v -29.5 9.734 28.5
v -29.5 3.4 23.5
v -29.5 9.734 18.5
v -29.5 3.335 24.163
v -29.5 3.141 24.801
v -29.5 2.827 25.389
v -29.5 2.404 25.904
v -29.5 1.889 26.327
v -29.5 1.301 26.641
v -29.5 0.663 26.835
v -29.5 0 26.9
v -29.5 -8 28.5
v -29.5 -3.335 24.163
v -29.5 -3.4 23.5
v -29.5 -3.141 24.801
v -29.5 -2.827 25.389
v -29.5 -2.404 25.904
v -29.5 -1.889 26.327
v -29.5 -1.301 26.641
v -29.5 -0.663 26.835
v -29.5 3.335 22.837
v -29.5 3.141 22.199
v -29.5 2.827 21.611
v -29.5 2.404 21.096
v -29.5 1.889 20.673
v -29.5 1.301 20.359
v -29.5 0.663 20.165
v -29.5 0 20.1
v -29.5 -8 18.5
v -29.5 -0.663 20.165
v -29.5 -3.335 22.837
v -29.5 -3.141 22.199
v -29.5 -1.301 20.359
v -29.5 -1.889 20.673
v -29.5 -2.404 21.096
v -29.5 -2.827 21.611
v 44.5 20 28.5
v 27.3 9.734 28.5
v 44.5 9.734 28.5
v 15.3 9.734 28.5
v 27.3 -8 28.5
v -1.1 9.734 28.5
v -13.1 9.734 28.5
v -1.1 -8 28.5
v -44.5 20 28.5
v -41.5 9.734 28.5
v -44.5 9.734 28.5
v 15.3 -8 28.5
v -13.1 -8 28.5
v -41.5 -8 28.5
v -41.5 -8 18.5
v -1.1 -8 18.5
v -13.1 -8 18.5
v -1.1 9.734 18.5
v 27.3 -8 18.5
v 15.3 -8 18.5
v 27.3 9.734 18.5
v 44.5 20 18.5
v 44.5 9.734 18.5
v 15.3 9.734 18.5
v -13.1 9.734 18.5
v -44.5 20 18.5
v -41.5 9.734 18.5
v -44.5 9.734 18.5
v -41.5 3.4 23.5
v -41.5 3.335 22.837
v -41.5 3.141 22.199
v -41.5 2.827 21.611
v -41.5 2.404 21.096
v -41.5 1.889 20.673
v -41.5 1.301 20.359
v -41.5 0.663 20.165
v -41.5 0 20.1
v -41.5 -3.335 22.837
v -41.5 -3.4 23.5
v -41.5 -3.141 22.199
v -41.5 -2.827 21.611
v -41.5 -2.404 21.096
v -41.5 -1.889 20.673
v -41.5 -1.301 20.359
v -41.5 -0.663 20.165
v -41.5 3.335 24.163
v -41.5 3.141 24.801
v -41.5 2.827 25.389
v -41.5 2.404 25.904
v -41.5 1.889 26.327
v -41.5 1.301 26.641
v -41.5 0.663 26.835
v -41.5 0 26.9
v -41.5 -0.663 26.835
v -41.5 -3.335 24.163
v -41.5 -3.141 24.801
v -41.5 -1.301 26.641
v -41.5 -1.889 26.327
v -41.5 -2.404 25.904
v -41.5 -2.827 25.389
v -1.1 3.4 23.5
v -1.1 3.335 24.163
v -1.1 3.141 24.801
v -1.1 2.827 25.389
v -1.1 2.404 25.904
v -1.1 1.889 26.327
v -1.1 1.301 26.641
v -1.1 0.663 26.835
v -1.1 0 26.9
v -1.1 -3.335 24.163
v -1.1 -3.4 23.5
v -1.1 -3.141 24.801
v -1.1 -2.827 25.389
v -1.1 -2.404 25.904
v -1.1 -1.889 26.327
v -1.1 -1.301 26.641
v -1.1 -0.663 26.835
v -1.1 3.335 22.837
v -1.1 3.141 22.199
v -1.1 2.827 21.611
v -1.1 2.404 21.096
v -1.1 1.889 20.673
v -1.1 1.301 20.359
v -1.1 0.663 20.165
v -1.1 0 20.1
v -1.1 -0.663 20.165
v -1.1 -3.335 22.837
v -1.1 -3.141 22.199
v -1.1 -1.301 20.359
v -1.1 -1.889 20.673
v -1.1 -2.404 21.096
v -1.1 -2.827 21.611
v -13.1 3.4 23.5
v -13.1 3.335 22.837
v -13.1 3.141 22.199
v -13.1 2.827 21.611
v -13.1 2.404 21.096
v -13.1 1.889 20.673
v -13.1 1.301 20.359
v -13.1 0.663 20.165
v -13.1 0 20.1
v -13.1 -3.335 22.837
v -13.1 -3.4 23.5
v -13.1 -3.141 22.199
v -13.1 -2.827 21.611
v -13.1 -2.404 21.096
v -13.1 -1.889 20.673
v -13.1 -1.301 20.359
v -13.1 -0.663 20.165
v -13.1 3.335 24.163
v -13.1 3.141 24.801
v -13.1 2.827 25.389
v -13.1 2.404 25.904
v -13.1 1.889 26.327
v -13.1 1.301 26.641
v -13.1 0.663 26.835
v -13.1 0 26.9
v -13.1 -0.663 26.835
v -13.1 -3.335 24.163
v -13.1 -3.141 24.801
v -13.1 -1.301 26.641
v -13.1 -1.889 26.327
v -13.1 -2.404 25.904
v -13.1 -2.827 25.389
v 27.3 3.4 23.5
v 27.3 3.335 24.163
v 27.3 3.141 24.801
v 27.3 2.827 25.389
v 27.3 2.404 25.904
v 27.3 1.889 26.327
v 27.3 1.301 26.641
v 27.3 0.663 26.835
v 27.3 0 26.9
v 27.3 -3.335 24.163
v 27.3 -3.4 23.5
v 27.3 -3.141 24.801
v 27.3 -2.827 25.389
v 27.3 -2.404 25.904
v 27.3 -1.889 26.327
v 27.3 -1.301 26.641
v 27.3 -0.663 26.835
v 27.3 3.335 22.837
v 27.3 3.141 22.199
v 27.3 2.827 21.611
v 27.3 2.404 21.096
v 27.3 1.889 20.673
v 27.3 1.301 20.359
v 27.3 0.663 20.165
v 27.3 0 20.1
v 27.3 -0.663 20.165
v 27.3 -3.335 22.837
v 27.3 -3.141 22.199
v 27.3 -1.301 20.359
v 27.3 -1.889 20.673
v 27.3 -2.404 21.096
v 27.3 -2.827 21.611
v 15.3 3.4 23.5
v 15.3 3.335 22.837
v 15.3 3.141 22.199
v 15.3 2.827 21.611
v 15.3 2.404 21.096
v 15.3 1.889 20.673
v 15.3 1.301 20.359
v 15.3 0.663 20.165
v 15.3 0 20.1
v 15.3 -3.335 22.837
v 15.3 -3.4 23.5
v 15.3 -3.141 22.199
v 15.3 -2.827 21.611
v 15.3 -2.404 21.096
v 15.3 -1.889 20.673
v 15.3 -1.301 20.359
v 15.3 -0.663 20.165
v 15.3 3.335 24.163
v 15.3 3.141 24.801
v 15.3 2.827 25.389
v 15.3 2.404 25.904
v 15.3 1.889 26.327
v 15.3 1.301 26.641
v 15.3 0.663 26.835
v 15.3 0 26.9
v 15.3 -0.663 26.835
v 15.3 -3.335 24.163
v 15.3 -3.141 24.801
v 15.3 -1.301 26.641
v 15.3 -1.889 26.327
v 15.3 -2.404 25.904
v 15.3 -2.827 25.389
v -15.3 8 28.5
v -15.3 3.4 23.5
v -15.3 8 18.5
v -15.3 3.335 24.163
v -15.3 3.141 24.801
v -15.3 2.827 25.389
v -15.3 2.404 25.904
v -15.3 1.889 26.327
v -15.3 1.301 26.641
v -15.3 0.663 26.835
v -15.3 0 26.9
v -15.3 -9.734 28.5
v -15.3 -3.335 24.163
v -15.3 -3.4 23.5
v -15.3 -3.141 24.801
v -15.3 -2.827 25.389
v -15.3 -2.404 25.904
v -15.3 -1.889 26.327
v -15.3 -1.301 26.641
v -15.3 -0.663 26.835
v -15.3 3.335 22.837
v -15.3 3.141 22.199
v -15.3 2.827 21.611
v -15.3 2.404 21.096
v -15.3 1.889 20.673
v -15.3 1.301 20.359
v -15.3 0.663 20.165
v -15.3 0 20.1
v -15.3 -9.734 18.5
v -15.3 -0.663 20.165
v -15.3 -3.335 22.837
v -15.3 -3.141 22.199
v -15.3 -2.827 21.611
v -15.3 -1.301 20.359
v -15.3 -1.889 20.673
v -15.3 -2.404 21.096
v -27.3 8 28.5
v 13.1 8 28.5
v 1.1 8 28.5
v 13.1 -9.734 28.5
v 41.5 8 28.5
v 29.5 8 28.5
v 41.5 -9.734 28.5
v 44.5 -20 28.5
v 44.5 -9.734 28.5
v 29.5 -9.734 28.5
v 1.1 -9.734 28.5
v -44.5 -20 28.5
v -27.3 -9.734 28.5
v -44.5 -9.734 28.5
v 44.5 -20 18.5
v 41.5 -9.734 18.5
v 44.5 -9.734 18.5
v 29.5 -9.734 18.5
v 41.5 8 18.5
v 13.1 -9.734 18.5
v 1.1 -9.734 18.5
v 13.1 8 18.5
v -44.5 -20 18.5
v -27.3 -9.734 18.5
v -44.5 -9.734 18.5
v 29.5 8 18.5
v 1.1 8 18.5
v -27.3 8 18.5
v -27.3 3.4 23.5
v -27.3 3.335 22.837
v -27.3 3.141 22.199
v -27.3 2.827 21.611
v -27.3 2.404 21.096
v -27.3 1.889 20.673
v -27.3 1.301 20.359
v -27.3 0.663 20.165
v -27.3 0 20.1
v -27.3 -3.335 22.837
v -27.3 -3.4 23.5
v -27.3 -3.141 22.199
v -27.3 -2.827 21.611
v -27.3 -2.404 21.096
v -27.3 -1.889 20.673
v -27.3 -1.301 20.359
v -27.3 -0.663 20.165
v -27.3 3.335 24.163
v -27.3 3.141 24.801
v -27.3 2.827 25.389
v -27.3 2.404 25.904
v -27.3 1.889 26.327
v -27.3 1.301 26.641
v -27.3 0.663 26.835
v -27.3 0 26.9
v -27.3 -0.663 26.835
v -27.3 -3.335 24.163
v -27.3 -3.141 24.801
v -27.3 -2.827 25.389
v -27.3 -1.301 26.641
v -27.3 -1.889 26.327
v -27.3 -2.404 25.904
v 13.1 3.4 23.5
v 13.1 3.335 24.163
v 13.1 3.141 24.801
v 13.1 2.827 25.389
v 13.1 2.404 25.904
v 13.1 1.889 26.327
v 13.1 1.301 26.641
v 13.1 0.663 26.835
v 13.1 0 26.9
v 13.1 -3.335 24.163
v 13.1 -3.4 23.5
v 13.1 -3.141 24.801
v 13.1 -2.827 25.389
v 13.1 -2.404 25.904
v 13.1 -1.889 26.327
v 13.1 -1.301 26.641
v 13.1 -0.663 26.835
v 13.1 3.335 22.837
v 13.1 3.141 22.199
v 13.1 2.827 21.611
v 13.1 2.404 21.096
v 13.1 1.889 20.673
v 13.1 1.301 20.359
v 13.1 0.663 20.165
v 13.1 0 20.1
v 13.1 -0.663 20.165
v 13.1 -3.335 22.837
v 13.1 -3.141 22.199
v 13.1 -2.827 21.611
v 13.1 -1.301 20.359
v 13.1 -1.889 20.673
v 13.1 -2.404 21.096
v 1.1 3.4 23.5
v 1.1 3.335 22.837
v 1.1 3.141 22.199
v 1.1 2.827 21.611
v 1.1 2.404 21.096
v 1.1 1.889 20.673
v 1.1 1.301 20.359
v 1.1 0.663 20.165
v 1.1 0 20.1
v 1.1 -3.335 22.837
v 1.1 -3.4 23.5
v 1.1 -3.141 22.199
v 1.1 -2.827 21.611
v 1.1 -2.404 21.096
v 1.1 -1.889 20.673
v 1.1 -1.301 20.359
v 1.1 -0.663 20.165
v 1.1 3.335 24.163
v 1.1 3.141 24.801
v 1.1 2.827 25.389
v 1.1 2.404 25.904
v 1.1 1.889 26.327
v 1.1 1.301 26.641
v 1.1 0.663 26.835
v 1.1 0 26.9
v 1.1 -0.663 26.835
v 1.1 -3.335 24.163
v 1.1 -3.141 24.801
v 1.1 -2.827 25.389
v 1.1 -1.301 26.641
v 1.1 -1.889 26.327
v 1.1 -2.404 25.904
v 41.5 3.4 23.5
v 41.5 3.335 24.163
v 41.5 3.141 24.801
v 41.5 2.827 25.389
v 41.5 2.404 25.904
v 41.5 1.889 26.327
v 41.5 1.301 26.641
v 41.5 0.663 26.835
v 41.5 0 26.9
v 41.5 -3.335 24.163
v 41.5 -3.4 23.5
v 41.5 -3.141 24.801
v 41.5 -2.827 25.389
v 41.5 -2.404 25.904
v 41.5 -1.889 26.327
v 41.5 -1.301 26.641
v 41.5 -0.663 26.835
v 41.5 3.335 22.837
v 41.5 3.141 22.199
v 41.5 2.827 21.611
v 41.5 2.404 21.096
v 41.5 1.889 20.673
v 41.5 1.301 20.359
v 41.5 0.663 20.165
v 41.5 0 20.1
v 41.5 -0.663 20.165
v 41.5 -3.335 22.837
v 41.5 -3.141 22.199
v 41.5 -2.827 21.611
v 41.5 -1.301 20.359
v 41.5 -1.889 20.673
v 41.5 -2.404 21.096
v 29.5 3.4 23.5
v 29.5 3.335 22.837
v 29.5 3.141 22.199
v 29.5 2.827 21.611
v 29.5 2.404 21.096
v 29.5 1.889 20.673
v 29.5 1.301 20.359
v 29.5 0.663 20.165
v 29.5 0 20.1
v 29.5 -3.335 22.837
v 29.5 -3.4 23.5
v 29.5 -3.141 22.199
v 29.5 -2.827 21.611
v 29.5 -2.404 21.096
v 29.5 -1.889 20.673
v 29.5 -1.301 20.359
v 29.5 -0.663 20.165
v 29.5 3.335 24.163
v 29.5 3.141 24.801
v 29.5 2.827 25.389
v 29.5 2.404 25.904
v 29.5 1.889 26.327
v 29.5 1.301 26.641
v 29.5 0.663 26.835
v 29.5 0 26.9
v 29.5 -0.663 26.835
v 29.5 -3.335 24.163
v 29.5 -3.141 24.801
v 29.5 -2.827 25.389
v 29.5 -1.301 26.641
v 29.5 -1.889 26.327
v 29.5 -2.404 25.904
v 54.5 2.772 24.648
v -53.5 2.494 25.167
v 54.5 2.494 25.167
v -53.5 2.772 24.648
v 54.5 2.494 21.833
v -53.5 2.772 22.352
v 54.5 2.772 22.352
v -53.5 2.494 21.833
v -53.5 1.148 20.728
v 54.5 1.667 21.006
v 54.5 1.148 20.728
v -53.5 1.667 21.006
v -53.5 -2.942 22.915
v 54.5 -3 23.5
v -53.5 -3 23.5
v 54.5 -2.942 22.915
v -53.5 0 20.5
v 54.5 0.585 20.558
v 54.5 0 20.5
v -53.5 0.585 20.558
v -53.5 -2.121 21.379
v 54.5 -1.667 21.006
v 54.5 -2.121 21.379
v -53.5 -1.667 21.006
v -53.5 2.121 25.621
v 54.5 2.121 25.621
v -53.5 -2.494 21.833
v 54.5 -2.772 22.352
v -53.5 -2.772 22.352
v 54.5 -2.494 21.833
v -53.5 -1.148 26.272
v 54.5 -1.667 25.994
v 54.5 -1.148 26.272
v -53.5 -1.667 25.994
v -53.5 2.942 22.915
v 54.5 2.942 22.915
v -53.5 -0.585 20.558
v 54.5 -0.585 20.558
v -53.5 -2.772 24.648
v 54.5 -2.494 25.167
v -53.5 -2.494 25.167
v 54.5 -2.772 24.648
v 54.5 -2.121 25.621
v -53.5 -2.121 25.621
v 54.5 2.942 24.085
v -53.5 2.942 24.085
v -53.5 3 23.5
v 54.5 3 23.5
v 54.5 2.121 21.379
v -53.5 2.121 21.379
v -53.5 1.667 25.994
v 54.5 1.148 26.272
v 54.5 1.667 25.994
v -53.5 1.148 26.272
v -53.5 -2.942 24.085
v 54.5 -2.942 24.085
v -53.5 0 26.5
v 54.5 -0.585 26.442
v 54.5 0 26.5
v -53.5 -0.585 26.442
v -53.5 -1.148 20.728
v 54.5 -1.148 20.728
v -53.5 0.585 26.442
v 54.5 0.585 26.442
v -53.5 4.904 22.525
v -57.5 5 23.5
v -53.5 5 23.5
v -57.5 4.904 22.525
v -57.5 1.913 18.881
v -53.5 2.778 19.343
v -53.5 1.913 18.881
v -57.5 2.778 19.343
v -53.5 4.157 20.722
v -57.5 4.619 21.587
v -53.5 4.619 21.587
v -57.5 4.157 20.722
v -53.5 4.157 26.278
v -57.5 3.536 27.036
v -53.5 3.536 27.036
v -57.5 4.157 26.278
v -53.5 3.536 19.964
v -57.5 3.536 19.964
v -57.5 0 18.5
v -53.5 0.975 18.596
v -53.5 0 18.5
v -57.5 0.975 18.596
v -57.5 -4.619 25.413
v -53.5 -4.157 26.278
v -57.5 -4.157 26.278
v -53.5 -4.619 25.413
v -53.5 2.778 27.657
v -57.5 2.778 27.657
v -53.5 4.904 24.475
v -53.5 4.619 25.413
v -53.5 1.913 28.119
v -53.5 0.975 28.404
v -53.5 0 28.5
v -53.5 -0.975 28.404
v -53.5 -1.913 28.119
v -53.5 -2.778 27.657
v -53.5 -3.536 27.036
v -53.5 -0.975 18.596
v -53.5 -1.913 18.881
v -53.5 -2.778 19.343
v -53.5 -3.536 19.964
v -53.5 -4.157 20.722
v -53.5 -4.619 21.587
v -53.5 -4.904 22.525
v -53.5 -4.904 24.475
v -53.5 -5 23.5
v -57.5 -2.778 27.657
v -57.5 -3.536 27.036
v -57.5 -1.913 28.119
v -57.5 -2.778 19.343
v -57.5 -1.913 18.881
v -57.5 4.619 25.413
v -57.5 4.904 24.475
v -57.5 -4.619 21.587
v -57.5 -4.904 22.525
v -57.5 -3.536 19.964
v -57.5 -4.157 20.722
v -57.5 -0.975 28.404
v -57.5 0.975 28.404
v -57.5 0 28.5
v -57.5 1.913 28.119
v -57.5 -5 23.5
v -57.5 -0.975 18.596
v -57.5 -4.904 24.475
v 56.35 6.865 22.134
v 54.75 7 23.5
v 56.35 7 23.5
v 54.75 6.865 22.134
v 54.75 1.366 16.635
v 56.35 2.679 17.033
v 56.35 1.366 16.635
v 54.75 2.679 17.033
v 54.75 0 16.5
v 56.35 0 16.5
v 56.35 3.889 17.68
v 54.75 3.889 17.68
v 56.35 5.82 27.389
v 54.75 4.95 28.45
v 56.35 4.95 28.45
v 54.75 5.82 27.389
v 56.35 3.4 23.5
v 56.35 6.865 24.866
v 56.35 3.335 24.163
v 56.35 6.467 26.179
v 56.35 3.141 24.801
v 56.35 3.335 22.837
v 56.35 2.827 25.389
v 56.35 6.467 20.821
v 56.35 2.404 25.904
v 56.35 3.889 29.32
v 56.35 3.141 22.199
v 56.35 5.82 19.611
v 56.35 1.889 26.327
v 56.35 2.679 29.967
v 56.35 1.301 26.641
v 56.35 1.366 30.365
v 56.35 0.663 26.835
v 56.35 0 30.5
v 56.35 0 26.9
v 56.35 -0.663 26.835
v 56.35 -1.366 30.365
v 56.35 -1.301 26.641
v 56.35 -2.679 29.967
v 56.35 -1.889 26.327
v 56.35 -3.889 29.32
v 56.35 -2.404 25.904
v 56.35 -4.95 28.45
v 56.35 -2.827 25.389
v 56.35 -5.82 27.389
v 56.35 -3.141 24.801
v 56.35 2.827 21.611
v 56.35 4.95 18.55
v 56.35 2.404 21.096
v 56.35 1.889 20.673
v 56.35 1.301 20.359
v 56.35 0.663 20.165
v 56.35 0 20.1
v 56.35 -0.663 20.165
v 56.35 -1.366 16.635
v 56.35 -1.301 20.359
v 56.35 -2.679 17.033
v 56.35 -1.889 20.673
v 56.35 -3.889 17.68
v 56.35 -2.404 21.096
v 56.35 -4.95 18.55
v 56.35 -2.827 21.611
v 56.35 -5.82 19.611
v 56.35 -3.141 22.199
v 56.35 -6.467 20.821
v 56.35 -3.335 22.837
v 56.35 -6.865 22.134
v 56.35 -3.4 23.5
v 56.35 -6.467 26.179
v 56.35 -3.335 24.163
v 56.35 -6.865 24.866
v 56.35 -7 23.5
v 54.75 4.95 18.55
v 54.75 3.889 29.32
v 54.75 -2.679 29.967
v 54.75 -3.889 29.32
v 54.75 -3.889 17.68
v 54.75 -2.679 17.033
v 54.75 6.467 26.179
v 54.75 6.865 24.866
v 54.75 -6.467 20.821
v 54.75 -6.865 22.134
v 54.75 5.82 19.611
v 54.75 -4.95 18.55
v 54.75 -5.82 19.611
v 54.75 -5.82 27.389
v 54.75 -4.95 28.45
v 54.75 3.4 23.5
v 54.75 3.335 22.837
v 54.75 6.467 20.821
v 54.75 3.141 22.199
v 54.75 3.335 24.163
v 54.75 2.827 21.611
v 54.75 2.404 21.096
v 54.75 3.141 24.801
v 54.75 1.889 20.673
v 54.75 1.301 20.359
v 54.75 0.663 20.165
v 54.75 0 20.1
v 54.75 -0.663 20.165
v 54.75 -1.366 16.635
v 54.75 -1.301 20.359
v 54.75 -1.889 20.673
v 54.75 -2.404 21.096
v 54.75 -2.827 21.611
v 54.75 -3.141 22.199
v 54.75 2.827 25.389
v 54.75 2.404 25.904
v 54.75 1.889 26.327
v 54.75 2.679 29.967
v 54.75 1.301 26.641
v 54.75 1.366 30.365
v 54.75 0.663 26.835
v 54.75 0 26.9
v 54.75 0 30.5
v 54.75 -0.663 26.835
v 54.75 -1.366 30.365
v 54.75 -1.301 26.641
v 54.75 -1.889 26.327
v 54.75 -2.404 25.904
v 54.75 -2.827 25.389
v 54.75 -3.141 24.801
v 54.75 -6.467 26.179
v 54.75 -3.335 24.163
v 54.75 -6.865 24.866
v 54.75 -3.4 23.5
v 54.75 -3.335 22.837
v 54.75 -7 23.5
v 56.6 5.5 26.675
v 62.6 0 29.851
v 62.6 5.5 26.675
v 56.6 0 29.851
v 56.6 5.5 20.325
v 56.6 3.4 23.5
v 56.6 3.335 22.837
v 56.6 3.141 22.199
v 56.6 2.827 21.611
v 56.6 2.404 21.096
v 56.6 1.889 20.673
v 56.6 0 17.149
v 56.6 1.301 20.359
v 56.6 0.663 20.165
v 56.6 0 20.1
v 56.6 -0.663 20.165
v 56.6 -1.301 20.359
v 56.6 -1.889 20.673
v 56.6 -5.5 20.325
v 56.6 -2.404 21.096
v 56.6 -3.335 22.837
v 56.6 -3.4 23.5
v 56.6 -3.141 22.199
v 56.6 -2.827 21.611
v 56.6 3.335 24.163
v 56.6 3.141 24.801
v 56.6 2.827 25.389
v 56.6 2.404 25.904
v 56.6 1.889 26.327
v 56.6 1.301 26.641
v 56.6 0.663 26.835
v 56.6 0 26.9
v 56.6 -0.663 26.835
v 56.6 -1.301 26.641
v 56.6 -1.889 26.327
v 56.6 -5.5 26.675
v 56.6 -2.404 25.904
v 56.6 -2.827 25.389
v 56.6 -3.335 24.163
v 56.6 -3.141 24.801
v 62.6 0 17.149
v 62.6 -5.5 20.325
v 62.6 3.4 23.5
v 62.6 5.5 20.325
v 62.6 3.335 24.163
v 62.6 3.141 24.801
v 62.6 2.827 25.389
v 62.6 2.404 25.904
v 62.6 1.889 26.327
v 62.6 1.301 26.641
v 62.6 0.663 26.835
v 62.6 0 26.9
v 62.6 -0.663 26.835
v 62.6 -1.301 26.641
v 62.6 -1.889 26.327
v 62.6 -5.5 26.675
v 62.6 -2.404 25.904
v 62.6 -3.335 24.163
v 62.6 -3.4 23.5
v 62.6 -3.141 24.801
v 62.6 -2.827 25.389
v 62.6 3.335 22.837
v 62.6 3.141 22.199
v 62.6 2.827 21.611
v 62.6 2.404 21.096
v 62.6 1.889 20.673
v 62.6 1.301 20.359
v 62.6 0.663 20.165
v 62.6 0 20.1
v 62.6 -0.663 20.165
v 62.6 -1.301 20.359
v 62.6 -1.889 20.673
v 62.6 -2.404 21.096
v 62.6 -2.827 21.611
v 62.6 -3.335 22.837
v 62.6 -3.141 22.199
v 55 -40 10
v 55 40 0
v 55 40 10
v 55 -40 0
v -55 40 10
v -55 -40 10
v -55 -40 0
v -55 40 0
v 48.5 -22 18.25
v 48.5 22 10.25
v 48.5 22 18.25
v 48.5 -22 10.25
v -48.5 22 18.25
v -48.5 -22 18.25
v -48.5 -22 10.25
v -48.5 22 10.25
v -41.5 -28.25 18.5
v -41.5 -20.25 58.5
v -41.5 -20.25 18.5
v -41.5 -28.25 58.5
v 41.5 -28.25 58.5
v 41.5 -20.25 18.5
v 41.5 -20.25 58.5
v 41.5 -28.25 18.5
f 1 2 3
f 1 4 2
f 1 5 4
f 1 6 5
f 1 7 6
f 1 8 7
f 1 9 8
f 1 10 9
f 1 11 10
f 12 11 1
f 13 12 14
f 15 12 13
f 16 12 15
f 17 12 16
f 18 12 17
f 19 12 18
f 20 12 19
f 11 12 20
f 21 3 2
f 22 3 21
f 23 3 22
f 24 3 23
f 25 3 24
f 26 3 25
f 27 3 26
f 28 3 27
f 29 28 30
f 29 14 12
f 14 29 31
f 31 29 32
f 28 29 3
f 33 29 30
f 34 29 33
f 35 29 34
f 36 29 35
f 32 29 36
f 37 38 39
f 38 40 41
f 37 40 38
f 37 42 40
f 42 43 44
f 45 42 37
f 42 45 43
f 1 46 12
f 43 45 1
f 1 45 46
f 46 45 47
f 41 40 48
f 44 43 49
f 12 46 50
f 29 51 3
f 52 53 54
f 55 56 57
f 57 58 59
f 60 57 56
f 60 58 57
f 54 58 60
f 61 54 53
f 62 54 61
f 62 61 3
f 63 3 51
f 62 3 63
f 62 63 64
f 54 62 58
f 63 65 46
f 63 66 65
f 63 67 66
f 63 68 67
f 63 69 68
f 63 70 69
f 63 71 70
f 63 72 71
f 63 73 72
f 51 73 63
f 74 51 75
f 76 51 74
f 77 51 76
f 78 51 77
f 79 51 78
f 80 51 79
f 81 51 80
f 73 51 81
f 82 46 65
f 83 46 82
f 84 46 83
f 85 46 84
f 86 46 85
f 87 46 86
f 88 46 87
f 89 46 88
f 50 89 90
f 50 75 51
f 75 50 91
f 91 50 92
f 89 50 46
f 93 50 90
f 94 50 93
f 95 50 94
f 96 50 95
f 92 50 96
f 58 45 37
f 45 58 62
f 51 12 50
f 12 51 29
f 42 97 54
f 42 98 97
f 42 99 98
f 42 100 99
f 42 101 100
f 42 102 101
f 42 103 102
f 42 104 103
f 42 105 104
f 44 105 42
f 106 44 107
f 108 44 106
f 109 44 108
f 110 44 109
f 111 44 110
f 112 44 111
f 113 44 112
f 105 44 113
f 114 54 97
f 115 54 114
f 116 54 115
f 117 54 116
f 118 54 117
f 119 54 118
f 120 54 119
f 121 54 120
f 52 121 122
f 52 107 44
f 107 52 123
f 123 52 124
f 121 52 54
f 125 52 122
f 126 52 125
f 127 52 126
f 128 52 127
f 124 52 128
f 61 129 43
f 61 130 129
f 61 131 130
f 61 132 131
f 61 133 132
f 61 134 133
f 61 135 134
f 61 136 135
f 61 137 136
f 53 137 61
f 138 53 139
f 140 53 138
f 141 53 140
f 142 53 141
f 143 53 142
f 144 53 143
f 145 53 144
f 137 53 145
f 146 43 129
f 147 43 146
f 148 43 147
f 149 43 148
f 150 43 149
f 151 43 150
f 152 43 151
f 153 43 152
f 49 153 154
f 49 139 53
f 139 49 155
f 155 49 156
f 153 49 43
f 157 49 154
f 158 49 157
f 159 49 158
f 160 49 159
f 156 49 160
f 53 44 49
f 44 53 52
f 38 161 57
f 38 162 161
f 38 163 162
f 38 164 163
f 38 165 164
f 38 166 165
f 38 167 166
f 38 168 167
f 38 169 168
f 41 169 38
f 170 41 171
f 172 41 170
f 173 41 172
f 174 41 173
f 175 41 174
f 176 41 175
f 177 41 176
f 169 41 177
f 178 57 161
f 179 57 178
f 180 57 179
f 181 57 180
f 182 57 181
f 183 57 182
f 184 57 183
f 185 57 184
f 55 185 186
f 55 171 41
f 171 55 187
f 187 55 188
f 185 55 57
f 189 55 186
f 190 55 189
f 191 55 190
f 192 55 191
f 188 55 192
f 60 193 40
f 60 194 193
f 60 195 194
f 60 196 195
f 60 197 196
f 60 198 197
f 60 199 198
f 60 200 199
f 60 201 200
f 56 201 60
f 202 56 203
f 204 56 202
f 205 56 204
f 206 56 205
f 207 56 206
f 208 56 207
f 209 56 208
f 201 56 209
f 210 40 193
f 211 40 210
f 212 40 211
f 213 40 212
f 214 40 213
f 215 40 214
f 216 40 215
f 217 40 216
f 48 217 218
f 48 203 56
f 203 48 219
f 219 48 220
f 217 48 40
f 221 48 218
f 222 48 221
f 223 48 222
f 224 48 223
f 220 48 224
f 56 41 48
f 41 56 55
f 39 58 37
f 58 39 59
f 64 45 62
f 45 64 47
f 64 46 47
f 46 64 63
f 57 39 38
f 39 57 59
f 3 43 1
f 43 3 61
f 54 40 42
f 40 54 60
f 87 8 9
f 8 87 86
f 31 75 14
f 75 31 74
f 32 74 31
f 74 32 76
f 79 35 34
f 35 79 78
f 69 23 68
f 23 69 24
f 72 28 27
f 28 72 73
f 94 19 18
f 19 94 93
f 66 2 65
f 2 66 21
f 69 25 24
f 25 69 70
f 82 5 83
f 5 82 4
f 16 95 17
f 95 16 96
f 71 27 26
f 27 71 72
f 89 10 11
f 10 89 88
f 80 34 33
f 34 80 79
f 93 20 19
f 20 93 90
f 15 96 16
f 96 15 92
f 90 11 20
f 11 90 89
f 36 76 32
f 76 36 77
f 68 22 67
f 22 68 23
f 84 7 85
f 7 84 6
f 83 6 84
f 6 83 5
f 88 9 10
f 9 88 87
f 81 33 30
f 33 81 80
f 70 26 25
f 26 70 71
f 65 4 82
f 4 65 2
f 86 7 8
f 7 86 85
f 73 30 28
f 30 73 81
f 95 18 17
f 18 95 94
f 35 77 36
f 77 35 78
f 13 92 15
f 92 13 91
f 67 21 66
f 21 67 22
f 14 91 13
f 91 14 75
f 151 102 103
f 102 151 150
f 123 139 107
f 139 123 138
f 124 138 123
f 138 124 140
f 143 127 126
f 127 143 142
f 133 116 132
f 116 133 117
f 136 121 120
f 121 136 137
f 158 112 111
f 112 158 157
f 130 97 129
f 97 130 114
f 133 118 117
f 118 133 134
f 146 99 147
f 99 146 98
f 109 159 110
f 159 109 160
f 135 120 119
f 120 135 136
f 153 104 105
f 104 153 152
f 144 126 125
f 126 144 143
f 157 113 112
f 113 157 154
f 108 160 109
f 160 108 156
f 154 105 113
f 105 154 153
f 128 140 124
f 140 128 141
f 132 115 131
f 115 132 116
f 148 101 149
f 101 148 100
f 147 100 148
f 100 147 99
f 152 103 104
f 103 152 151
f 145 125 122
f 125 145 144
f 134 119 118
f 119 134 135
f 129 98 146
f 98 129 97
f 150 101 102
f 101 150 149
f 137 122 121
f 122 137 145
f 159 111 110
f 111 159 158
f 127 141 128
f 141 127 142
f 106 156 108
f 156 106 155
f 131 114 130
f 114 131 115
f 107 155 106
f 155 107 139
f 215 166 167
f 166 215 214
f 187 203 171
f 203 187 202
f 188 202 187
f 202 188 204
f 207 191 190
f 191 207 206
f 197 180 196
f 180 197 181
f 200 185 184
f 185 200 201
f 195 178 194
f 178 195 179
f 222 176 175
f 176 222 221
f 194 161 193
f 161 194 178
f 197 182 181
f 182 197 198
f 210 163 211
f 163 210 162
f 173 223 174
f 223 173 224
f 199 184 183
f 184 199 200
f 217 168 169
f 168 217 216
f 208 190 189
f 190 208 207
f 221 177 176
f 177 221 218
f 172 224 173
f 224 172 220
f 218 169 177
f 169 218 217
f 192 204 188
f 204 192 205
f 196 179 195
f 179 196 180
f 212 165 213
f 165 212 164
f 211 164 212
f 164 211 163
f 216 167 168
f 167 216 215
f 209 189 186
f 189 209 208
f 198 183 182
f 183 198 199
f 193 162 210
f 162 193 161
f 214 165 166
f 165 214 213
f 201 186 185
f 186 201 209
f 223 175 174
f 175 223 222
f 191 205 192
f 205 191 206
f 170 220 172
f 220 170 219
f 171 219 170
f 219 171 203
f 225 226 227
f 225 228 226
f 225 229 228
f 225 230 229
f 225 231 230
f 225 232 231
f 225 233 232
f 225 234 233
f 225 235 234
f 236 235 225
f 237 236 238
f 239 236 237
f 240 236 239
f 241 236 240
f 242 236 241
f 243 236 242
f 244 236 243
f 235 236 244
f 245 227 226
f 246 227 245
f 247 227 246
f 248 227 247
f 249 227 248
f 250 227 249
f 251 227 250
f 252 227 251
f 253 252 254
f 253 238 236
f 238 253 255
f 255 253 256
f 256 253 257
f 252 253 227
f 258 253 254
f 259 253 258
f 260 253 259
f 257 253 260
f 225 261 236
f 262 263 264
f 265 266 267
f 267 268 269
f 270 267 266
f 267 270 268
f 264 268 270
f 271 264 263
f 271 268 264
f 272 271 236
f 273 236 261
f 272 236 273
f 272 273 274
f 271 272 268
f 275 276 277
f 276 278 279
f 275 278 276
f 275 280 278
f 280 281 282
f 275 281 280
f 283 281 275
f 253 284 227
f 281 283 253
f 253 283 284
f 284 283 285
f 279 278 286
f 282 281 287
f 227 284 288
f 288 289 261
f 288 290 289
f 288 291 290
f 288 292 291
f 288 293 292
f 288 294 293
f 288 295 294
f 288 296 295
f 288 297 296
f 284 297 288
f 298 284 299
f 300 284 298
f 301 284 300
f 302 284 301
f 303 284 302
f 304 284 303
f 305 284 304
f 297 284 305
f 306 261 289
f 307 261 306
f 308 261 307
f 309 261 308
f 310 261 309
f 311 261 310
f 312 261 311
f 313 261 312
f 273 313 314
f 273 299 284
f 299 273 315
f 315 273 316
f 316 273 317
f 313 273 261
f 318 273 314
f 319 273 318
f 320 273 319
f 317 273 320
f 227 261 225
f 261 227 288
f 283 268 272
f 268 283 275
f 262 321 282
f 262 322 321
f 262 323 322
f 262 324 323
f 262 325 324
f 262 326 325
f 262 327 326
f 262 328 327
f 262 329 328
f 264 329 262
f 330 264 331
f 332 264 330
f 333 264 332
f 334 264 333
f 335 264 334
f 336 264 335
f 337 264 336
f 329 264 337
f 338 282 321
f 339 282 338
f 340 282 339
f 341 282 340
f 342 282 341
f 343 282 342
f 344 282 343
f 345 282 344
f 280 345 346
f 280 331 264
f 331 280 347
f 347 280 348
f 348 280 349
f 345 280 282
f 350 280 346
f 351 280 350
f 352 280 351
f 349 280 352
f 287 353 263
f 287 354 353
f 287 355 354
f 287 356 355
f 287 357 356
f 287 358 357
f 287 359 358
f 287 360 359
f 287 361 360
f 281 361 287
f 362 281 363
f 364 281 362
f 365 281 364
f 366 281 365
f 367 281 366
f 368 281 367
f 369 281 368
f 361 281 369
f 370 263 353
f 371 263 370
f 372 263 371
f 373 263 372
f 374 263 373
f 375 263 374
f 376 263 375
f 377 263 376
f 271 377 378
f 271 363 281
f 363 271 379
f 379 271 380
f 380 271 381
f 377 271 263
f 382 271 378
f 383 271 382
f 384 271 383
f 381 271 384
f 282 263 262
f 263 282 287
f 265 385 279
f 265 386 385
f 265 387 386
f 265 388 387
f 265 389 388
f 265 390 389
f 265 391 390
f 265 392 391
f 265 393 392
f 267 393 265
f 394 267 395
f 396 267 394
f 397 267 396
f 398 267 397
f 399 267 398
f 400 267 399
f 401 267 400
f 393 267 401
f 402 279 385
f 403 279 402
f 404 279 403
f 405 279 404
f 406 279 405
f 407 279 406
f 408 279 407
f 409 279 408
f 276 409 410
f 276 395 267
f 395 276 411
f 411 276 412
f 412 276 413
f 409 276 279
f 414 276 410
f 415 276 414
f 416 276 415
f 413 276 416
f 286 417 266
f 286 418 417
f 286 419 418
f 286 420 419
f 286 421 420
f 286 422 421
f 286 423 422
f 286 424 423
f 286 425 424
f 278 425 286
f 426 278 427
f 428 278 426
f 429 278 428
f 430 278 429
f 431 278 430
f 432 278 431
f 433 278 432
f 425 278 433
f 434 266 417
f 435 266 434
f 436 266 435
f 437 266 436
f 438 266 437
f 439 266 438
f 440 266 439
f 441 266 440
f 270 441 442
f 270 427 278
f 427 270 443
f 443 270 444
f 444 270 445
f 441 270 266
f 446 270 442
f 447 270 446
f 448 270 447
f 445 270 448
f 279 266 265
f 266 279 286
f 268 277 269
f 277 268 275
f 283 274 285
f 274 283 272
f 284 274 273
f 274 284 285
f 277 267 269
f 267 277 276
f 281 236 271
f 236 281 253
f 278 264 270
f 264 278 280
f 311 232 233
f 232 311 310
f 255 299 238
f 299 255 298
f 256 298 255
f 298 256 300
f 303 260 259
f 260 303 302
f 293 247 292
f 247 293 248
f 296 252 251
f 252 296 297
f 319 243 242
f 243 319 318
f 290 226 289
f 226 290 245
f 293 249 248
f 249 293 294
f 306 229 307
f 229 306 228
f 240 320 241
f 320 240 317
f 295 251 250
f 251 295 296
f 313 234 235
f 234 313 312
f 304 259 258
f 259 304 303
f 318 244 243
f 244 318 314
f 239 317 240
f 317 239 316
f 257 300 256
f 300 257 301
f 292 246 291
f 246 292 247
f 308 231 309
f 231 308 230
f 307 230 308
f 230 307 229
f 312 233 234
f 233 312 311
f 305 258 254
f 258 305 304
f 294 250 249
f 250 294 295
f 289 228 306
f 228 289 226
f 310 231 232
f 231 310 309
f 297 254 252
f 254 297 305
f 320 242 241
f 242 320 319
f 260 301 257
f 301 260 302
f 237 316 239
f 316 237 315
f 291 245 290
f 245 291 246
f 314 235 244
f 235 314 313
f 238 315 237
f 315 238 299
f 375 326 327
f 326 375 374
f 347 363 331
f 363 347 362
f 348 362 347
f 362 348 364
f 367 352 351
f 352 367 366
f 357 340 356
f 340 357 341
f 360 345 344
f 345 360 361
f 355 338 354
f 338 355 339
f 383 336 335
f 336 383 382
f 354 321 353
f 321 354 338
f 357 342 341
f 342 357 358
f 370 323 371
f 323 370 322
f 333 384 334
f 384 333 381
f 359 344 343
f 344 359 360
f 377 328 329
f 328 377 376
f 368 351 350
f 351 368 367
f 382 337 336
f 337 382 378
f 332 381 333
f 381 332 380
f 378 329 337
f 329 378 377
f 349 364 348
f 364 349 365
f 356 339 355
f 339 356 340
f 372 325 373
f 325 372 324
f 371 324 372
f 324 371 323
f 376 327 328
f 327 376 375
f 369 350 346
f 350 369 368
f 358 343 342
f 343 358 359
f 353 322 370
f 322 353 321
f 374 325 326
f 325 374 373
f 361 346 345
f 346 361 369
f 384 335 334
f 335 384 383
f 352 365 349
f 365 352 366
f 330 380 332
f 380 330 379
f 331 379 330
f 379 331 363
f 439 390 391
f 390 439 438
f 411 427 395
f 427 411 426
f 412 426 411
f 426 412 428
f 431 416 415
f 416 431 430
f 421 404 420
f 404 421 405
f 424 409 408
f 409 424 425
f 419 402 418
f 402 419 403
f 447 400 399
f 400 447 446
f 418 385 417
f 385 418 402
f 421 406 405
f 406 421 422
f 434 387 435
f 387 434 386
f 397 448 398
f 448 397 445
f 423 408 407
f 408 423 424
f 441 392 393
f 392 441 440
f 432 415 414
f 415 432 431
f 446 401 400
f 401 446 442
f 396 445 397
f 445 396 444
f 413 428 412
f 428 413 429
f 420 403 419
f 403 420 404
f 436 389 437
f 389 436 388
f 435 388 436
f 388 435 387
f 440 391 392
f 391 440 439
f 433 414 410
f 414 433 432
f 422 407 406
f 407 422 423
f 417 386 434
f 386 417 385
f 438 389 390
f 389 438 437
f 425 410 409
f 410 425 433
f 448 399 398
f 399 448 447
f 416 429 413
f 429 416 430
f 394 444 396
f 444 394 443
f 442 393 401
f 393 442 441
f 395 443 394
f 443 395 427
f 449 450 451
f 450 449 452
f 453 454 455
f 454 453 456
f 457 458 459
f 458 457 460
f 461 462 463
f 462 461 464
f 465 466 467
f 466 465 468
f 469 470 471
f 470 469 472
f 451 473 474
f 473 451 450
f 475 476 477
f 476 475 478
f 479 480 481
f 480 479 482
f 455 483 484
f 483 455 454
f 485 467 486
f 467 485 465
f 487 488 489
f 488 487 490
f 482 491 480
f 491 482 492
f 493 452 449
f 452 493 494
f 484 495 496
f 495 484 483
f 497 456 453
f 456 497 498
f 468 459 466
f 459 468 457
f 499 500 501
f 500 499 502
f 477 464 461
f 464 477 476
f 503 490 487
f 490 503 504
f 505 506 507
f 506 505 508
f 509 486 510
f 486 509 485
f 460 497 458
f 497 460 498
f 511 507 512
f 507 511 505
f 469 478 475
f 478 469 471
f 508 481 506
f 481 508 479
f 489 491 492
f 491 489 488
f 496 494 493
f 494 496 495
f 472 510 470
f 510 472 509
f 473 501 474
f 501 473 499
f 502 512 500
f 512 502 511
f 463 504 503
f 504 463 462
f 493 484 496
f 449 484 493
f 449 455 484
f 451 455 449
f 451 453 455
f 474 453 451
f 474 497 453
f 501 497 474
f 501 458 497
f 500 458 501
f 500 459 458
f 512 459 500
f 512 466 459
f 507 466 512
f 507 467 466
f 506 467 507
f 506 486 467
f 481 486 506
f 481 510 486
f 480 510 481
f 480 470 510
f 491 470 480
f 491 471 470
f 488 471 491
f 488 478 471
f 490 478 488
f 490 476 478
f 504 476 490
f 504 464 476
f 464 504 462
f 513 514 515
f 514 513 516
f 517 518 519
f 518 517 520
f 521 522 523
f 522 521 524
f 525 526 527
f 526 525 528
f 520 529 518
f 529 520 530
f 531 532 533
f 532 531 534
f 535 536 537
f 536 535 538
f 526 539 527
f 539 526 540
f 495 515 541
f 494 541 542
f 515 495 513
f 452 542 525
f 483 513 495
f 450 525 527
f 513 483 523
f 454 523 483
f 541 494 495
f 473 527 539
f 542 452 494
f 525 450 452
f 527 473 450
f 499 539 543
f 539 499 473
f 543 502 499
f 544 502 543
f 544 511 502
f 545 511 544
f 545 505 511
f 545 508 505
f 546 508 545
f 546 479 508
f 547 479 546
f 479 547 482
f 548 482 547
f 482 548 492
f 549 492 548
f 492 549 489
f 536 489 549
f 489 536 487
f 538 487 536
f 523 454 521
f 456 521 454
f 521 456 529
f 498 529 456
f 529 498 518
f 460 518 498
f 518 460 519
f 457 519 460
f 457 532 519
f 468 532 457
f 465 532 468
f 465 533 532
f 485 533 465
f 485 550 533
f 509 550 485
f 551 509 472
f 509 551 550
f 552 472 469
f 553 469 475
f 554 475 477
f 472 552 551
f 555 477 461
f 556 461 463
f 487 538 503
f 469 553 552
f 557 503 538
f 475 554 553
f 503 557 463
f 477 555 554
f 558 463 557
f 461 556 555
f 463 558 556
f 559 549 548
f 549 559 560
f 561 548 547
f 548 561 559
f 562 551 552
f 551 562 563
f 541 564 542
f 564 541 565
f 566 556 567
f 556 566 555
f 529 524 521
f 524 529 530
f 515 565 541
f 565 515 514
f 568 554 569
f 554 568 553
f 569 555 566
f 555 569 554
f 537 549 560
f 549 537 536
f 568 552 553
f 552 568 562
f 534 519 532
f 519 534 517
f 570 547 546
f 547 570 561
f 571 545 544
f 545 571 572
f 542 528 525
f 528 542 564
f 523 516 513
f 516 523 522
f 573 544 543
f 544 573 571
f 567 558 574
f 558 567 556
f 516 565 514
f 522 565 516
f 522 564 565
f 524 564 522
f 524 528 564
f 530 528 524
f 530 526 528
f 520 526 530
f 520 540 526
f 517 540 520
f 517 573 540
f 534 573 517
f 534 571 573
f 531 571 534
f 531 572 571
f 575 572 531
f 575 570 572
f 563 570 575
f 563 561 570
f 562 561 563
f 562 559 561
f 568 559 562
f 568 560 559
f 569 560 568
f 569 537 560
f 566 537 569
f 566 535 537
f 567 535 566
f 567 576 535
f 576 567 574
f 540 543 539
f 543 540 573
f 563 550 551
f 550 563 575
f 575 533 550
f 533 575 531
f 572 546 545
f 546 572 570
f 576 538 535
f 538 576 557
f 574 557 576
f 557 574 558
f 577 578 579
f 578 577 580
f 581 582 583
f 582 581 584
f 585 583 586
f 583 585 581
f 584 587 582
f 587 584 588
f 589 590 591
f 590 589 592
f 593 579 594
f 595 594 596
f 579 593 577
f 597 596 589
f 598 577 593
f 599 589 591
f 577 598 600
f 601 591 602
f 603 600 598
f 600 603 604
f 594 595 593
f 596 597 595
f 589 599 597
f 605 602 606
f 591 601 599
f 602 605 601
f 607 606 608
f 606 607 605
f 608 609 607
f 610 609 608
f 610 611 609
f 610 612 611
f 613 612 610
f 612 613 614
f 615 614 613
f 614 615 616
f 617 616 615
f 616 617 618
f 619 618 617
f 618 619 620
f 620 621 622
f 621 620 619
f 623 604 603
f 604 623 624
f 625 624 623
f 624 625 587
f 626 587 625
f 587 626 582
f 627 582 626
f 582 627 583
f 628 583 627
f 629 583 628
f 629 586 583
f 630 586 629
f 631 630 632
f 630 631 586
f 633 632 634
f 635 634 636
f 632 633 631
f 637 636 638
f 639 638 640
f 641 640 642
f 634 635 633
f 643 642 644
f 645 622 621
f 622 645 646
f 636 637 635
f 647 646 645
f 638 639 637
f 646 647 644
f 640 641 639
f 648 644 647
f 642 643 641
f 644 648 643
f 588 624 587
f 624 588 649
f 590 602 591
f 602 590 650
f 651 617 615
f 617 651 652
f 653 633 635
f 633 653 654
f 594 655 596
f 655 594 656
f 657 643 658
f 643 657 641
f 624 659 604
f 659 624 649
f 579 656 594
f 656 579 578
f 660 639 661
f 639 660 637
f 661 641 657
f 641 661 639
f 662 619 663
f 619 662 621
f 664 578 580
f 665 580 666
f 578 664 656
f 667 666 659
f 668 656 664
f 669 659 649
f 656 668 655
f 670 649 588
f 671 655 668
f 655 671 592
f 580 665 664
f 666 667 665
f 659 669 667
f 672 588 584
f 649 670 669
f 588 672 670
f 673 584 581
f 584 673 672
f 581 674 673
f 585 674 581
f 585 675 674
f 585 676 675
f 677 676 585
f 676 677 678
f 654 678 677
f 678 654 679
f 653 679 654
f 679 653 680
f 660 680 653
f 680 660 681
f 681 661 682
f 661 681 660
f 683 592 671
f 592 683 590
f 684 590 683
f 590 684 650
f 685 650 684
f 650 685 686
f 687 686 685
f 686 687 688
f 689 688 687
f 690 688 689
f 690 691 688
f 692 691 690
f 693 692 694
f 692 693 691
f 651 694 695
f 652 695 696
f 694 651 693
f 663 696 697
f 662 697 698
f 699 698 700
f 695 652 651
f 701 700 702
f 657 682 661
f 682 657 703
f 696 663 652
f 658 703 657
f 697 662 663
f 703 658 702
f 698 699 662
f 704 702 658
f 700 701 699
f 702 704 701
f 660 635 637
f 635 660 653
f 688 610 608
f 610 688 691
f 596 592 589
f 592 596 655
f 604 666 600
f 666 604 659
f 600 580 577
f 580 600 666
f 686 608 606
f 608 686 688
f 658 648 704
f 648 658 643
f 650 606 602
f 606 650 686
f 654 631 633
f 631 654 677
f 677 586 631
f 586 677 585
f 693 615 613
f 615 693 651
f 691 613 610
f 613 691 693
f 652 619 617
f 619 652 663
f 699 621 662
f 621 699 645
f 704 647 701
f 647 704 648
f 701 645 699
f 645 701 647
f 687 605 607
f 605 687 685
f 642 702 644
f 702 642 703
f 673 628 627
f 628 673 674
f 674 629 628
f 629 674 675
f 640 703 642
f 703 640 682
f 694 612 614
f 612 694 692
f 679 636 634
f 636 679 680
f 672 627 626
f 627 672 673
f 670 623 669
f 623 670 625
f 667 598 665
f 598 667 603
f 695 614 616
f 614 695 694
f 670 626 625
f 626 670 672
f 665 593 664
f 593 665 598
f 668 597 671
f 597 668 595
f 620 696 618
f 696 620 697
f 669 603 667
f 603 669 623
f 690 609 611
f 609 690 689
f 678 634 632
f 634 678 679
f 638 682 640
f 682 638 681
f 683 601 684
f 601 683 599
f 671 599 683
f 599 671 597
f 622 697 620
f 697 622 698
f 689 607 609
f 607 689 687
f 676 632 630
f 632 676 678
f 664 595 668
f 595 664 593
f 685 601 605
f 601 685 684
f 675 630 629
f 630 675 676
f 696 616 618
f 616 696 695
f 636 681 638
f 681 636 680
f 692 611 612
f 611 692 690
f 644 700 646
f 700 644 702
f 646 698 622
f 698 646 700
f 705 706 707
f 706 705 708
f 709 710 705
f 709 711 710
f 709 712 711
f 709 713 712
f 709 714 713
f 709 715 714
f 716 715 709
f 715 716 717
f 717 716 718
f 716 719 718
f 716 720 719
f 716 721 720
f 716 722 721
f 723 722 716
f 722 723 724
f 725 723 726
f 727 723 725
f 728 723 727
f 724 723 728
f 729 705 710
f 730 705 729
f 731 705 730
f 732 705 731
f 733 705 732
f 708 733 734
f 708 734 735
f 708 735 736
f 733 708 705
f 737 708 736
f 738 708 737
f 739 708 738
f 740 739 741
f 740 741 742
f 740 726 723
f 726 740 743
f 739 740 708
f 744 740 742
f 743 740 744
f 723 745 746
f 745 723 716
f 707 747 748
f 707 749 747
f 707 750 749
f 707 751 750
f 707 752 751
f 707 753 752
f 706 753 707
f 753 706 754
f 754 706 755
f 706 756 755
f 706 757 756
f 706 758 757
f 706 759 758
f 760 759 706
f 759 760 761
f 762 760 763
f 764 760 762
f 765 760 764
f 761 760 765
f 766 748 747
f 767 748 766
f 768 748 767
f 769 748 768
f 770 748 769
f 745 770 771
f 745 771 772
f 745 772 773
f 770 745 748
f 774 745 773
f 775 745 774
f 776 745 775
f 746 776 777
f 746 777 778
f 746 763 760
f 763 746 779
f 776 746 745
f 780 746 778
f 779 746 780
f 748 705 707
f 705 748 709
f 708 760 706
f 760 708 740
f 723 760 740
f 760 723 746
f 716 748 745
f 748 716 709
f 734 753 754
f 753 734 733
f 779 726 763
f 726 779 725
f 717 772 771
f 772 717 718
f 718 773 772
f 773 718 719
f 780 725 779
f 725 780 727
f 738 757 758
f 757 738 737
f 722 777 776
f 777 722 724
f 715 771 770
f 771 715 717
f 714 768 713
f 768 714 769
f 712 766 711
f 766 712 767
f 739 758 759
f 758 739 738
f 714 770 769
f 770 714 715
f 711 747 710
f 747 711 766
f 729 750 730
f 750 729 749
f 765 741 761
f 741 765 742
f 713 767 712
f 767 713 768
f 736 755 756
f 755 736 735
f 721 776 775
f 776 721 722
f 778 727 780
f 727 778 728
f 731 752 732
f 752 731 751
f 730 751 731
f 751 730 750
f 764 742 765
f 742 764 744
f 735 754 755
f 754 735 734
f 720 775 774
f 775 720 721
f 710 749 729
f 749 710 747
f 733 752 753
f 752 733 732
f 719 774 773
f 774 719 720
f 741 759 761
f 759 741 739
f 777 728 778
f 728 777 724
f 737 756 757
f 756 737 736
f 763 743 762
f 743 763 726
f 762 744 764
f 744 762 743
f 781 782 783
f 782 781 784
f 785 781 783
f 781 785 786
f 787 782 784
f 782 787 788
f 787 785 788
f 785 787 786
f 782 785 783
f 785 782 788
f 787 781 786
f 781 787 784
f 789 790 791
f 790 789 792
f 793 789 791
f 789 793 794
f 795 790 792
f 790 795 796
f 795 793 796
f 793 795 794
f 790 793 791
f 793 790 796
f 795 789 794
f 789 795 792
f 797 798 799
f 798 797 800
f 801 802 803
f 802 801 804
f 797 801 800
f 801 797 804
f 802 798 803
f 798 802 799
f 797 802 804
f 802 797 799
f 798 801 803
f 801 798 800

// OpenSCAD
$fn = 32;

// ------------------------------------------------------------------------
// Comb hinge with flap: leaf 89 x 20 mm, pin d6, flap 40 mm
// Every part is its own module, assembly() places every instance.
// ------------------------------------------------------------------------

// --- part 1 ---
module hinge_bed() {
  difference() {
    translate([-55, -40, 0]) cube([110, 80, 10]);
  }
}

// --- part 2 ---
module hinge_riser() {
  difference() {
    translate([-48.5, -22, 0]) cube([97, 44, 8]);
  }
}

// --- part 3 ---
module hinge_leaf_a() {
  difference() {
    union() {
      translate([-41.5, -8, -5]) cube([12, 28, 10]);
      translate([-13.1, -8, -5]) cube([12, 28, 10]);
      translate([15.3, -8, -5]) cube([12, 28, 10]);
      translate([-44.5, 9.734, -5]) cube([89, 10.266, 10]);
    }
    translate([-35.5, 0, 0]) rotate([0, 90, 0]) cylinder(h = 14, d = 6.8, center = true);
    translate([-7.1, 0, 0]) rotate([0, 90, 0]) cylinder(h = 14, d = 6.8, center = true);
    translate([21.3, 0, 0]) rotate([0, 90, 0]) cylinder(h = 14, d = 6.8, center = true);
  }
}

// --- part 4 ---
module hinge_leaf_b() {
  difference() {
    union() {
      translate([-27.3, -20, -5]) cube([12, 28, 10]);
      translate([1.1, -20, -5]) cube([12, 28, 10]);
      translate([29.5, -20, -5]) cube([12, 28, 10]);
      translate([-44.5, -20, -5]) cube([89, 10.266, 10]);
    }
    translate([-21.3, 0, 0]) rotate([0, 90, 0]) cylinder(h = 14, d = 6.8, center = true);
    translate([7.1, 0, 0]) rotate([0, 90, 0]) cylinder(h = 14, d = 6.8, center = true);
    translate([35.5, 0, 0]) rotate([0, 90, 0]) cylinder(h = 14, d = 6.8, center = true);
  }
}

// --- part 5 ---
module hinge_flap() {
  difference() {
    translate([-41.5, -20, 0]) cube([83, 40, 8]);
  }
}

// --- part 6 ---
module hinge_pin() {
  rotate([0, 90, 0]) cylinder(h = 109, d = 6, center = true);
  translate([-57.5, 0, 0]) rotate([0, 90, 0]) cylinder(h = 4, d = 10);
}

// --- part 7 ---
module pin_washer() {
  difference() {
      translate([0, 0, 0]) cylinder(h = 1.6, d = 14);
      translate([0, 0, -1]) cylinder(h = 3.6, d = 6.8);
    }
}

// --- part 8 ---
module pin_nut() {
  difference() {
    linear_extrude(height = 6) polygon(points = [[6.351, 0], [3.175, 5.5], [-3.175, 5.5], [-6.351, 0], [-3.175, -5.5], [3.175, -5.5]]);
    translate([0, 0, -1]) cylinder(h = 8, d = 6.8);
  }
}

// --- assembly ---
module assembly() {
  color([0.80, 0.24, 0.20]) translate([0, 0, 0]) rotate([0, 0, 0]) hinge_bed();
  color([0.20, 0.45, 0.75]) translate([0, 0, 10.25]) rotate([0, 0, 0]) hinge_riser();
  color([0.25, 0.62, 0.32]) translate([0, 0, 23.5]) rotate([0, 0, 0]) hinge_leaf_a();
  color([0.92, 0.70, 0.18]) translate([0, 0, 23.5]) rotate([0, 0, 0]) hinge_leaf_b();
  color([0.58, 0.35, 0.70]) translate([0, -20.25, 38.5]) rotate([90, 0, 0]) hinge_flap();
  color([0.16, 0.66, 0.66]) translate([0, 0, 23.5]) rotate([0, 0, 0]) hinge_pin();
  color([0.85, 0.48, 0.18]) translate([54.75, 0, 23.5]) rotate([0, 90, 0]) pin_washer();
  color([0.55, 0.60, 0.65]) translate([56.6, 0, 23.5]) rotate([0, 90, 0]) pin_nut();
}

assembly();
